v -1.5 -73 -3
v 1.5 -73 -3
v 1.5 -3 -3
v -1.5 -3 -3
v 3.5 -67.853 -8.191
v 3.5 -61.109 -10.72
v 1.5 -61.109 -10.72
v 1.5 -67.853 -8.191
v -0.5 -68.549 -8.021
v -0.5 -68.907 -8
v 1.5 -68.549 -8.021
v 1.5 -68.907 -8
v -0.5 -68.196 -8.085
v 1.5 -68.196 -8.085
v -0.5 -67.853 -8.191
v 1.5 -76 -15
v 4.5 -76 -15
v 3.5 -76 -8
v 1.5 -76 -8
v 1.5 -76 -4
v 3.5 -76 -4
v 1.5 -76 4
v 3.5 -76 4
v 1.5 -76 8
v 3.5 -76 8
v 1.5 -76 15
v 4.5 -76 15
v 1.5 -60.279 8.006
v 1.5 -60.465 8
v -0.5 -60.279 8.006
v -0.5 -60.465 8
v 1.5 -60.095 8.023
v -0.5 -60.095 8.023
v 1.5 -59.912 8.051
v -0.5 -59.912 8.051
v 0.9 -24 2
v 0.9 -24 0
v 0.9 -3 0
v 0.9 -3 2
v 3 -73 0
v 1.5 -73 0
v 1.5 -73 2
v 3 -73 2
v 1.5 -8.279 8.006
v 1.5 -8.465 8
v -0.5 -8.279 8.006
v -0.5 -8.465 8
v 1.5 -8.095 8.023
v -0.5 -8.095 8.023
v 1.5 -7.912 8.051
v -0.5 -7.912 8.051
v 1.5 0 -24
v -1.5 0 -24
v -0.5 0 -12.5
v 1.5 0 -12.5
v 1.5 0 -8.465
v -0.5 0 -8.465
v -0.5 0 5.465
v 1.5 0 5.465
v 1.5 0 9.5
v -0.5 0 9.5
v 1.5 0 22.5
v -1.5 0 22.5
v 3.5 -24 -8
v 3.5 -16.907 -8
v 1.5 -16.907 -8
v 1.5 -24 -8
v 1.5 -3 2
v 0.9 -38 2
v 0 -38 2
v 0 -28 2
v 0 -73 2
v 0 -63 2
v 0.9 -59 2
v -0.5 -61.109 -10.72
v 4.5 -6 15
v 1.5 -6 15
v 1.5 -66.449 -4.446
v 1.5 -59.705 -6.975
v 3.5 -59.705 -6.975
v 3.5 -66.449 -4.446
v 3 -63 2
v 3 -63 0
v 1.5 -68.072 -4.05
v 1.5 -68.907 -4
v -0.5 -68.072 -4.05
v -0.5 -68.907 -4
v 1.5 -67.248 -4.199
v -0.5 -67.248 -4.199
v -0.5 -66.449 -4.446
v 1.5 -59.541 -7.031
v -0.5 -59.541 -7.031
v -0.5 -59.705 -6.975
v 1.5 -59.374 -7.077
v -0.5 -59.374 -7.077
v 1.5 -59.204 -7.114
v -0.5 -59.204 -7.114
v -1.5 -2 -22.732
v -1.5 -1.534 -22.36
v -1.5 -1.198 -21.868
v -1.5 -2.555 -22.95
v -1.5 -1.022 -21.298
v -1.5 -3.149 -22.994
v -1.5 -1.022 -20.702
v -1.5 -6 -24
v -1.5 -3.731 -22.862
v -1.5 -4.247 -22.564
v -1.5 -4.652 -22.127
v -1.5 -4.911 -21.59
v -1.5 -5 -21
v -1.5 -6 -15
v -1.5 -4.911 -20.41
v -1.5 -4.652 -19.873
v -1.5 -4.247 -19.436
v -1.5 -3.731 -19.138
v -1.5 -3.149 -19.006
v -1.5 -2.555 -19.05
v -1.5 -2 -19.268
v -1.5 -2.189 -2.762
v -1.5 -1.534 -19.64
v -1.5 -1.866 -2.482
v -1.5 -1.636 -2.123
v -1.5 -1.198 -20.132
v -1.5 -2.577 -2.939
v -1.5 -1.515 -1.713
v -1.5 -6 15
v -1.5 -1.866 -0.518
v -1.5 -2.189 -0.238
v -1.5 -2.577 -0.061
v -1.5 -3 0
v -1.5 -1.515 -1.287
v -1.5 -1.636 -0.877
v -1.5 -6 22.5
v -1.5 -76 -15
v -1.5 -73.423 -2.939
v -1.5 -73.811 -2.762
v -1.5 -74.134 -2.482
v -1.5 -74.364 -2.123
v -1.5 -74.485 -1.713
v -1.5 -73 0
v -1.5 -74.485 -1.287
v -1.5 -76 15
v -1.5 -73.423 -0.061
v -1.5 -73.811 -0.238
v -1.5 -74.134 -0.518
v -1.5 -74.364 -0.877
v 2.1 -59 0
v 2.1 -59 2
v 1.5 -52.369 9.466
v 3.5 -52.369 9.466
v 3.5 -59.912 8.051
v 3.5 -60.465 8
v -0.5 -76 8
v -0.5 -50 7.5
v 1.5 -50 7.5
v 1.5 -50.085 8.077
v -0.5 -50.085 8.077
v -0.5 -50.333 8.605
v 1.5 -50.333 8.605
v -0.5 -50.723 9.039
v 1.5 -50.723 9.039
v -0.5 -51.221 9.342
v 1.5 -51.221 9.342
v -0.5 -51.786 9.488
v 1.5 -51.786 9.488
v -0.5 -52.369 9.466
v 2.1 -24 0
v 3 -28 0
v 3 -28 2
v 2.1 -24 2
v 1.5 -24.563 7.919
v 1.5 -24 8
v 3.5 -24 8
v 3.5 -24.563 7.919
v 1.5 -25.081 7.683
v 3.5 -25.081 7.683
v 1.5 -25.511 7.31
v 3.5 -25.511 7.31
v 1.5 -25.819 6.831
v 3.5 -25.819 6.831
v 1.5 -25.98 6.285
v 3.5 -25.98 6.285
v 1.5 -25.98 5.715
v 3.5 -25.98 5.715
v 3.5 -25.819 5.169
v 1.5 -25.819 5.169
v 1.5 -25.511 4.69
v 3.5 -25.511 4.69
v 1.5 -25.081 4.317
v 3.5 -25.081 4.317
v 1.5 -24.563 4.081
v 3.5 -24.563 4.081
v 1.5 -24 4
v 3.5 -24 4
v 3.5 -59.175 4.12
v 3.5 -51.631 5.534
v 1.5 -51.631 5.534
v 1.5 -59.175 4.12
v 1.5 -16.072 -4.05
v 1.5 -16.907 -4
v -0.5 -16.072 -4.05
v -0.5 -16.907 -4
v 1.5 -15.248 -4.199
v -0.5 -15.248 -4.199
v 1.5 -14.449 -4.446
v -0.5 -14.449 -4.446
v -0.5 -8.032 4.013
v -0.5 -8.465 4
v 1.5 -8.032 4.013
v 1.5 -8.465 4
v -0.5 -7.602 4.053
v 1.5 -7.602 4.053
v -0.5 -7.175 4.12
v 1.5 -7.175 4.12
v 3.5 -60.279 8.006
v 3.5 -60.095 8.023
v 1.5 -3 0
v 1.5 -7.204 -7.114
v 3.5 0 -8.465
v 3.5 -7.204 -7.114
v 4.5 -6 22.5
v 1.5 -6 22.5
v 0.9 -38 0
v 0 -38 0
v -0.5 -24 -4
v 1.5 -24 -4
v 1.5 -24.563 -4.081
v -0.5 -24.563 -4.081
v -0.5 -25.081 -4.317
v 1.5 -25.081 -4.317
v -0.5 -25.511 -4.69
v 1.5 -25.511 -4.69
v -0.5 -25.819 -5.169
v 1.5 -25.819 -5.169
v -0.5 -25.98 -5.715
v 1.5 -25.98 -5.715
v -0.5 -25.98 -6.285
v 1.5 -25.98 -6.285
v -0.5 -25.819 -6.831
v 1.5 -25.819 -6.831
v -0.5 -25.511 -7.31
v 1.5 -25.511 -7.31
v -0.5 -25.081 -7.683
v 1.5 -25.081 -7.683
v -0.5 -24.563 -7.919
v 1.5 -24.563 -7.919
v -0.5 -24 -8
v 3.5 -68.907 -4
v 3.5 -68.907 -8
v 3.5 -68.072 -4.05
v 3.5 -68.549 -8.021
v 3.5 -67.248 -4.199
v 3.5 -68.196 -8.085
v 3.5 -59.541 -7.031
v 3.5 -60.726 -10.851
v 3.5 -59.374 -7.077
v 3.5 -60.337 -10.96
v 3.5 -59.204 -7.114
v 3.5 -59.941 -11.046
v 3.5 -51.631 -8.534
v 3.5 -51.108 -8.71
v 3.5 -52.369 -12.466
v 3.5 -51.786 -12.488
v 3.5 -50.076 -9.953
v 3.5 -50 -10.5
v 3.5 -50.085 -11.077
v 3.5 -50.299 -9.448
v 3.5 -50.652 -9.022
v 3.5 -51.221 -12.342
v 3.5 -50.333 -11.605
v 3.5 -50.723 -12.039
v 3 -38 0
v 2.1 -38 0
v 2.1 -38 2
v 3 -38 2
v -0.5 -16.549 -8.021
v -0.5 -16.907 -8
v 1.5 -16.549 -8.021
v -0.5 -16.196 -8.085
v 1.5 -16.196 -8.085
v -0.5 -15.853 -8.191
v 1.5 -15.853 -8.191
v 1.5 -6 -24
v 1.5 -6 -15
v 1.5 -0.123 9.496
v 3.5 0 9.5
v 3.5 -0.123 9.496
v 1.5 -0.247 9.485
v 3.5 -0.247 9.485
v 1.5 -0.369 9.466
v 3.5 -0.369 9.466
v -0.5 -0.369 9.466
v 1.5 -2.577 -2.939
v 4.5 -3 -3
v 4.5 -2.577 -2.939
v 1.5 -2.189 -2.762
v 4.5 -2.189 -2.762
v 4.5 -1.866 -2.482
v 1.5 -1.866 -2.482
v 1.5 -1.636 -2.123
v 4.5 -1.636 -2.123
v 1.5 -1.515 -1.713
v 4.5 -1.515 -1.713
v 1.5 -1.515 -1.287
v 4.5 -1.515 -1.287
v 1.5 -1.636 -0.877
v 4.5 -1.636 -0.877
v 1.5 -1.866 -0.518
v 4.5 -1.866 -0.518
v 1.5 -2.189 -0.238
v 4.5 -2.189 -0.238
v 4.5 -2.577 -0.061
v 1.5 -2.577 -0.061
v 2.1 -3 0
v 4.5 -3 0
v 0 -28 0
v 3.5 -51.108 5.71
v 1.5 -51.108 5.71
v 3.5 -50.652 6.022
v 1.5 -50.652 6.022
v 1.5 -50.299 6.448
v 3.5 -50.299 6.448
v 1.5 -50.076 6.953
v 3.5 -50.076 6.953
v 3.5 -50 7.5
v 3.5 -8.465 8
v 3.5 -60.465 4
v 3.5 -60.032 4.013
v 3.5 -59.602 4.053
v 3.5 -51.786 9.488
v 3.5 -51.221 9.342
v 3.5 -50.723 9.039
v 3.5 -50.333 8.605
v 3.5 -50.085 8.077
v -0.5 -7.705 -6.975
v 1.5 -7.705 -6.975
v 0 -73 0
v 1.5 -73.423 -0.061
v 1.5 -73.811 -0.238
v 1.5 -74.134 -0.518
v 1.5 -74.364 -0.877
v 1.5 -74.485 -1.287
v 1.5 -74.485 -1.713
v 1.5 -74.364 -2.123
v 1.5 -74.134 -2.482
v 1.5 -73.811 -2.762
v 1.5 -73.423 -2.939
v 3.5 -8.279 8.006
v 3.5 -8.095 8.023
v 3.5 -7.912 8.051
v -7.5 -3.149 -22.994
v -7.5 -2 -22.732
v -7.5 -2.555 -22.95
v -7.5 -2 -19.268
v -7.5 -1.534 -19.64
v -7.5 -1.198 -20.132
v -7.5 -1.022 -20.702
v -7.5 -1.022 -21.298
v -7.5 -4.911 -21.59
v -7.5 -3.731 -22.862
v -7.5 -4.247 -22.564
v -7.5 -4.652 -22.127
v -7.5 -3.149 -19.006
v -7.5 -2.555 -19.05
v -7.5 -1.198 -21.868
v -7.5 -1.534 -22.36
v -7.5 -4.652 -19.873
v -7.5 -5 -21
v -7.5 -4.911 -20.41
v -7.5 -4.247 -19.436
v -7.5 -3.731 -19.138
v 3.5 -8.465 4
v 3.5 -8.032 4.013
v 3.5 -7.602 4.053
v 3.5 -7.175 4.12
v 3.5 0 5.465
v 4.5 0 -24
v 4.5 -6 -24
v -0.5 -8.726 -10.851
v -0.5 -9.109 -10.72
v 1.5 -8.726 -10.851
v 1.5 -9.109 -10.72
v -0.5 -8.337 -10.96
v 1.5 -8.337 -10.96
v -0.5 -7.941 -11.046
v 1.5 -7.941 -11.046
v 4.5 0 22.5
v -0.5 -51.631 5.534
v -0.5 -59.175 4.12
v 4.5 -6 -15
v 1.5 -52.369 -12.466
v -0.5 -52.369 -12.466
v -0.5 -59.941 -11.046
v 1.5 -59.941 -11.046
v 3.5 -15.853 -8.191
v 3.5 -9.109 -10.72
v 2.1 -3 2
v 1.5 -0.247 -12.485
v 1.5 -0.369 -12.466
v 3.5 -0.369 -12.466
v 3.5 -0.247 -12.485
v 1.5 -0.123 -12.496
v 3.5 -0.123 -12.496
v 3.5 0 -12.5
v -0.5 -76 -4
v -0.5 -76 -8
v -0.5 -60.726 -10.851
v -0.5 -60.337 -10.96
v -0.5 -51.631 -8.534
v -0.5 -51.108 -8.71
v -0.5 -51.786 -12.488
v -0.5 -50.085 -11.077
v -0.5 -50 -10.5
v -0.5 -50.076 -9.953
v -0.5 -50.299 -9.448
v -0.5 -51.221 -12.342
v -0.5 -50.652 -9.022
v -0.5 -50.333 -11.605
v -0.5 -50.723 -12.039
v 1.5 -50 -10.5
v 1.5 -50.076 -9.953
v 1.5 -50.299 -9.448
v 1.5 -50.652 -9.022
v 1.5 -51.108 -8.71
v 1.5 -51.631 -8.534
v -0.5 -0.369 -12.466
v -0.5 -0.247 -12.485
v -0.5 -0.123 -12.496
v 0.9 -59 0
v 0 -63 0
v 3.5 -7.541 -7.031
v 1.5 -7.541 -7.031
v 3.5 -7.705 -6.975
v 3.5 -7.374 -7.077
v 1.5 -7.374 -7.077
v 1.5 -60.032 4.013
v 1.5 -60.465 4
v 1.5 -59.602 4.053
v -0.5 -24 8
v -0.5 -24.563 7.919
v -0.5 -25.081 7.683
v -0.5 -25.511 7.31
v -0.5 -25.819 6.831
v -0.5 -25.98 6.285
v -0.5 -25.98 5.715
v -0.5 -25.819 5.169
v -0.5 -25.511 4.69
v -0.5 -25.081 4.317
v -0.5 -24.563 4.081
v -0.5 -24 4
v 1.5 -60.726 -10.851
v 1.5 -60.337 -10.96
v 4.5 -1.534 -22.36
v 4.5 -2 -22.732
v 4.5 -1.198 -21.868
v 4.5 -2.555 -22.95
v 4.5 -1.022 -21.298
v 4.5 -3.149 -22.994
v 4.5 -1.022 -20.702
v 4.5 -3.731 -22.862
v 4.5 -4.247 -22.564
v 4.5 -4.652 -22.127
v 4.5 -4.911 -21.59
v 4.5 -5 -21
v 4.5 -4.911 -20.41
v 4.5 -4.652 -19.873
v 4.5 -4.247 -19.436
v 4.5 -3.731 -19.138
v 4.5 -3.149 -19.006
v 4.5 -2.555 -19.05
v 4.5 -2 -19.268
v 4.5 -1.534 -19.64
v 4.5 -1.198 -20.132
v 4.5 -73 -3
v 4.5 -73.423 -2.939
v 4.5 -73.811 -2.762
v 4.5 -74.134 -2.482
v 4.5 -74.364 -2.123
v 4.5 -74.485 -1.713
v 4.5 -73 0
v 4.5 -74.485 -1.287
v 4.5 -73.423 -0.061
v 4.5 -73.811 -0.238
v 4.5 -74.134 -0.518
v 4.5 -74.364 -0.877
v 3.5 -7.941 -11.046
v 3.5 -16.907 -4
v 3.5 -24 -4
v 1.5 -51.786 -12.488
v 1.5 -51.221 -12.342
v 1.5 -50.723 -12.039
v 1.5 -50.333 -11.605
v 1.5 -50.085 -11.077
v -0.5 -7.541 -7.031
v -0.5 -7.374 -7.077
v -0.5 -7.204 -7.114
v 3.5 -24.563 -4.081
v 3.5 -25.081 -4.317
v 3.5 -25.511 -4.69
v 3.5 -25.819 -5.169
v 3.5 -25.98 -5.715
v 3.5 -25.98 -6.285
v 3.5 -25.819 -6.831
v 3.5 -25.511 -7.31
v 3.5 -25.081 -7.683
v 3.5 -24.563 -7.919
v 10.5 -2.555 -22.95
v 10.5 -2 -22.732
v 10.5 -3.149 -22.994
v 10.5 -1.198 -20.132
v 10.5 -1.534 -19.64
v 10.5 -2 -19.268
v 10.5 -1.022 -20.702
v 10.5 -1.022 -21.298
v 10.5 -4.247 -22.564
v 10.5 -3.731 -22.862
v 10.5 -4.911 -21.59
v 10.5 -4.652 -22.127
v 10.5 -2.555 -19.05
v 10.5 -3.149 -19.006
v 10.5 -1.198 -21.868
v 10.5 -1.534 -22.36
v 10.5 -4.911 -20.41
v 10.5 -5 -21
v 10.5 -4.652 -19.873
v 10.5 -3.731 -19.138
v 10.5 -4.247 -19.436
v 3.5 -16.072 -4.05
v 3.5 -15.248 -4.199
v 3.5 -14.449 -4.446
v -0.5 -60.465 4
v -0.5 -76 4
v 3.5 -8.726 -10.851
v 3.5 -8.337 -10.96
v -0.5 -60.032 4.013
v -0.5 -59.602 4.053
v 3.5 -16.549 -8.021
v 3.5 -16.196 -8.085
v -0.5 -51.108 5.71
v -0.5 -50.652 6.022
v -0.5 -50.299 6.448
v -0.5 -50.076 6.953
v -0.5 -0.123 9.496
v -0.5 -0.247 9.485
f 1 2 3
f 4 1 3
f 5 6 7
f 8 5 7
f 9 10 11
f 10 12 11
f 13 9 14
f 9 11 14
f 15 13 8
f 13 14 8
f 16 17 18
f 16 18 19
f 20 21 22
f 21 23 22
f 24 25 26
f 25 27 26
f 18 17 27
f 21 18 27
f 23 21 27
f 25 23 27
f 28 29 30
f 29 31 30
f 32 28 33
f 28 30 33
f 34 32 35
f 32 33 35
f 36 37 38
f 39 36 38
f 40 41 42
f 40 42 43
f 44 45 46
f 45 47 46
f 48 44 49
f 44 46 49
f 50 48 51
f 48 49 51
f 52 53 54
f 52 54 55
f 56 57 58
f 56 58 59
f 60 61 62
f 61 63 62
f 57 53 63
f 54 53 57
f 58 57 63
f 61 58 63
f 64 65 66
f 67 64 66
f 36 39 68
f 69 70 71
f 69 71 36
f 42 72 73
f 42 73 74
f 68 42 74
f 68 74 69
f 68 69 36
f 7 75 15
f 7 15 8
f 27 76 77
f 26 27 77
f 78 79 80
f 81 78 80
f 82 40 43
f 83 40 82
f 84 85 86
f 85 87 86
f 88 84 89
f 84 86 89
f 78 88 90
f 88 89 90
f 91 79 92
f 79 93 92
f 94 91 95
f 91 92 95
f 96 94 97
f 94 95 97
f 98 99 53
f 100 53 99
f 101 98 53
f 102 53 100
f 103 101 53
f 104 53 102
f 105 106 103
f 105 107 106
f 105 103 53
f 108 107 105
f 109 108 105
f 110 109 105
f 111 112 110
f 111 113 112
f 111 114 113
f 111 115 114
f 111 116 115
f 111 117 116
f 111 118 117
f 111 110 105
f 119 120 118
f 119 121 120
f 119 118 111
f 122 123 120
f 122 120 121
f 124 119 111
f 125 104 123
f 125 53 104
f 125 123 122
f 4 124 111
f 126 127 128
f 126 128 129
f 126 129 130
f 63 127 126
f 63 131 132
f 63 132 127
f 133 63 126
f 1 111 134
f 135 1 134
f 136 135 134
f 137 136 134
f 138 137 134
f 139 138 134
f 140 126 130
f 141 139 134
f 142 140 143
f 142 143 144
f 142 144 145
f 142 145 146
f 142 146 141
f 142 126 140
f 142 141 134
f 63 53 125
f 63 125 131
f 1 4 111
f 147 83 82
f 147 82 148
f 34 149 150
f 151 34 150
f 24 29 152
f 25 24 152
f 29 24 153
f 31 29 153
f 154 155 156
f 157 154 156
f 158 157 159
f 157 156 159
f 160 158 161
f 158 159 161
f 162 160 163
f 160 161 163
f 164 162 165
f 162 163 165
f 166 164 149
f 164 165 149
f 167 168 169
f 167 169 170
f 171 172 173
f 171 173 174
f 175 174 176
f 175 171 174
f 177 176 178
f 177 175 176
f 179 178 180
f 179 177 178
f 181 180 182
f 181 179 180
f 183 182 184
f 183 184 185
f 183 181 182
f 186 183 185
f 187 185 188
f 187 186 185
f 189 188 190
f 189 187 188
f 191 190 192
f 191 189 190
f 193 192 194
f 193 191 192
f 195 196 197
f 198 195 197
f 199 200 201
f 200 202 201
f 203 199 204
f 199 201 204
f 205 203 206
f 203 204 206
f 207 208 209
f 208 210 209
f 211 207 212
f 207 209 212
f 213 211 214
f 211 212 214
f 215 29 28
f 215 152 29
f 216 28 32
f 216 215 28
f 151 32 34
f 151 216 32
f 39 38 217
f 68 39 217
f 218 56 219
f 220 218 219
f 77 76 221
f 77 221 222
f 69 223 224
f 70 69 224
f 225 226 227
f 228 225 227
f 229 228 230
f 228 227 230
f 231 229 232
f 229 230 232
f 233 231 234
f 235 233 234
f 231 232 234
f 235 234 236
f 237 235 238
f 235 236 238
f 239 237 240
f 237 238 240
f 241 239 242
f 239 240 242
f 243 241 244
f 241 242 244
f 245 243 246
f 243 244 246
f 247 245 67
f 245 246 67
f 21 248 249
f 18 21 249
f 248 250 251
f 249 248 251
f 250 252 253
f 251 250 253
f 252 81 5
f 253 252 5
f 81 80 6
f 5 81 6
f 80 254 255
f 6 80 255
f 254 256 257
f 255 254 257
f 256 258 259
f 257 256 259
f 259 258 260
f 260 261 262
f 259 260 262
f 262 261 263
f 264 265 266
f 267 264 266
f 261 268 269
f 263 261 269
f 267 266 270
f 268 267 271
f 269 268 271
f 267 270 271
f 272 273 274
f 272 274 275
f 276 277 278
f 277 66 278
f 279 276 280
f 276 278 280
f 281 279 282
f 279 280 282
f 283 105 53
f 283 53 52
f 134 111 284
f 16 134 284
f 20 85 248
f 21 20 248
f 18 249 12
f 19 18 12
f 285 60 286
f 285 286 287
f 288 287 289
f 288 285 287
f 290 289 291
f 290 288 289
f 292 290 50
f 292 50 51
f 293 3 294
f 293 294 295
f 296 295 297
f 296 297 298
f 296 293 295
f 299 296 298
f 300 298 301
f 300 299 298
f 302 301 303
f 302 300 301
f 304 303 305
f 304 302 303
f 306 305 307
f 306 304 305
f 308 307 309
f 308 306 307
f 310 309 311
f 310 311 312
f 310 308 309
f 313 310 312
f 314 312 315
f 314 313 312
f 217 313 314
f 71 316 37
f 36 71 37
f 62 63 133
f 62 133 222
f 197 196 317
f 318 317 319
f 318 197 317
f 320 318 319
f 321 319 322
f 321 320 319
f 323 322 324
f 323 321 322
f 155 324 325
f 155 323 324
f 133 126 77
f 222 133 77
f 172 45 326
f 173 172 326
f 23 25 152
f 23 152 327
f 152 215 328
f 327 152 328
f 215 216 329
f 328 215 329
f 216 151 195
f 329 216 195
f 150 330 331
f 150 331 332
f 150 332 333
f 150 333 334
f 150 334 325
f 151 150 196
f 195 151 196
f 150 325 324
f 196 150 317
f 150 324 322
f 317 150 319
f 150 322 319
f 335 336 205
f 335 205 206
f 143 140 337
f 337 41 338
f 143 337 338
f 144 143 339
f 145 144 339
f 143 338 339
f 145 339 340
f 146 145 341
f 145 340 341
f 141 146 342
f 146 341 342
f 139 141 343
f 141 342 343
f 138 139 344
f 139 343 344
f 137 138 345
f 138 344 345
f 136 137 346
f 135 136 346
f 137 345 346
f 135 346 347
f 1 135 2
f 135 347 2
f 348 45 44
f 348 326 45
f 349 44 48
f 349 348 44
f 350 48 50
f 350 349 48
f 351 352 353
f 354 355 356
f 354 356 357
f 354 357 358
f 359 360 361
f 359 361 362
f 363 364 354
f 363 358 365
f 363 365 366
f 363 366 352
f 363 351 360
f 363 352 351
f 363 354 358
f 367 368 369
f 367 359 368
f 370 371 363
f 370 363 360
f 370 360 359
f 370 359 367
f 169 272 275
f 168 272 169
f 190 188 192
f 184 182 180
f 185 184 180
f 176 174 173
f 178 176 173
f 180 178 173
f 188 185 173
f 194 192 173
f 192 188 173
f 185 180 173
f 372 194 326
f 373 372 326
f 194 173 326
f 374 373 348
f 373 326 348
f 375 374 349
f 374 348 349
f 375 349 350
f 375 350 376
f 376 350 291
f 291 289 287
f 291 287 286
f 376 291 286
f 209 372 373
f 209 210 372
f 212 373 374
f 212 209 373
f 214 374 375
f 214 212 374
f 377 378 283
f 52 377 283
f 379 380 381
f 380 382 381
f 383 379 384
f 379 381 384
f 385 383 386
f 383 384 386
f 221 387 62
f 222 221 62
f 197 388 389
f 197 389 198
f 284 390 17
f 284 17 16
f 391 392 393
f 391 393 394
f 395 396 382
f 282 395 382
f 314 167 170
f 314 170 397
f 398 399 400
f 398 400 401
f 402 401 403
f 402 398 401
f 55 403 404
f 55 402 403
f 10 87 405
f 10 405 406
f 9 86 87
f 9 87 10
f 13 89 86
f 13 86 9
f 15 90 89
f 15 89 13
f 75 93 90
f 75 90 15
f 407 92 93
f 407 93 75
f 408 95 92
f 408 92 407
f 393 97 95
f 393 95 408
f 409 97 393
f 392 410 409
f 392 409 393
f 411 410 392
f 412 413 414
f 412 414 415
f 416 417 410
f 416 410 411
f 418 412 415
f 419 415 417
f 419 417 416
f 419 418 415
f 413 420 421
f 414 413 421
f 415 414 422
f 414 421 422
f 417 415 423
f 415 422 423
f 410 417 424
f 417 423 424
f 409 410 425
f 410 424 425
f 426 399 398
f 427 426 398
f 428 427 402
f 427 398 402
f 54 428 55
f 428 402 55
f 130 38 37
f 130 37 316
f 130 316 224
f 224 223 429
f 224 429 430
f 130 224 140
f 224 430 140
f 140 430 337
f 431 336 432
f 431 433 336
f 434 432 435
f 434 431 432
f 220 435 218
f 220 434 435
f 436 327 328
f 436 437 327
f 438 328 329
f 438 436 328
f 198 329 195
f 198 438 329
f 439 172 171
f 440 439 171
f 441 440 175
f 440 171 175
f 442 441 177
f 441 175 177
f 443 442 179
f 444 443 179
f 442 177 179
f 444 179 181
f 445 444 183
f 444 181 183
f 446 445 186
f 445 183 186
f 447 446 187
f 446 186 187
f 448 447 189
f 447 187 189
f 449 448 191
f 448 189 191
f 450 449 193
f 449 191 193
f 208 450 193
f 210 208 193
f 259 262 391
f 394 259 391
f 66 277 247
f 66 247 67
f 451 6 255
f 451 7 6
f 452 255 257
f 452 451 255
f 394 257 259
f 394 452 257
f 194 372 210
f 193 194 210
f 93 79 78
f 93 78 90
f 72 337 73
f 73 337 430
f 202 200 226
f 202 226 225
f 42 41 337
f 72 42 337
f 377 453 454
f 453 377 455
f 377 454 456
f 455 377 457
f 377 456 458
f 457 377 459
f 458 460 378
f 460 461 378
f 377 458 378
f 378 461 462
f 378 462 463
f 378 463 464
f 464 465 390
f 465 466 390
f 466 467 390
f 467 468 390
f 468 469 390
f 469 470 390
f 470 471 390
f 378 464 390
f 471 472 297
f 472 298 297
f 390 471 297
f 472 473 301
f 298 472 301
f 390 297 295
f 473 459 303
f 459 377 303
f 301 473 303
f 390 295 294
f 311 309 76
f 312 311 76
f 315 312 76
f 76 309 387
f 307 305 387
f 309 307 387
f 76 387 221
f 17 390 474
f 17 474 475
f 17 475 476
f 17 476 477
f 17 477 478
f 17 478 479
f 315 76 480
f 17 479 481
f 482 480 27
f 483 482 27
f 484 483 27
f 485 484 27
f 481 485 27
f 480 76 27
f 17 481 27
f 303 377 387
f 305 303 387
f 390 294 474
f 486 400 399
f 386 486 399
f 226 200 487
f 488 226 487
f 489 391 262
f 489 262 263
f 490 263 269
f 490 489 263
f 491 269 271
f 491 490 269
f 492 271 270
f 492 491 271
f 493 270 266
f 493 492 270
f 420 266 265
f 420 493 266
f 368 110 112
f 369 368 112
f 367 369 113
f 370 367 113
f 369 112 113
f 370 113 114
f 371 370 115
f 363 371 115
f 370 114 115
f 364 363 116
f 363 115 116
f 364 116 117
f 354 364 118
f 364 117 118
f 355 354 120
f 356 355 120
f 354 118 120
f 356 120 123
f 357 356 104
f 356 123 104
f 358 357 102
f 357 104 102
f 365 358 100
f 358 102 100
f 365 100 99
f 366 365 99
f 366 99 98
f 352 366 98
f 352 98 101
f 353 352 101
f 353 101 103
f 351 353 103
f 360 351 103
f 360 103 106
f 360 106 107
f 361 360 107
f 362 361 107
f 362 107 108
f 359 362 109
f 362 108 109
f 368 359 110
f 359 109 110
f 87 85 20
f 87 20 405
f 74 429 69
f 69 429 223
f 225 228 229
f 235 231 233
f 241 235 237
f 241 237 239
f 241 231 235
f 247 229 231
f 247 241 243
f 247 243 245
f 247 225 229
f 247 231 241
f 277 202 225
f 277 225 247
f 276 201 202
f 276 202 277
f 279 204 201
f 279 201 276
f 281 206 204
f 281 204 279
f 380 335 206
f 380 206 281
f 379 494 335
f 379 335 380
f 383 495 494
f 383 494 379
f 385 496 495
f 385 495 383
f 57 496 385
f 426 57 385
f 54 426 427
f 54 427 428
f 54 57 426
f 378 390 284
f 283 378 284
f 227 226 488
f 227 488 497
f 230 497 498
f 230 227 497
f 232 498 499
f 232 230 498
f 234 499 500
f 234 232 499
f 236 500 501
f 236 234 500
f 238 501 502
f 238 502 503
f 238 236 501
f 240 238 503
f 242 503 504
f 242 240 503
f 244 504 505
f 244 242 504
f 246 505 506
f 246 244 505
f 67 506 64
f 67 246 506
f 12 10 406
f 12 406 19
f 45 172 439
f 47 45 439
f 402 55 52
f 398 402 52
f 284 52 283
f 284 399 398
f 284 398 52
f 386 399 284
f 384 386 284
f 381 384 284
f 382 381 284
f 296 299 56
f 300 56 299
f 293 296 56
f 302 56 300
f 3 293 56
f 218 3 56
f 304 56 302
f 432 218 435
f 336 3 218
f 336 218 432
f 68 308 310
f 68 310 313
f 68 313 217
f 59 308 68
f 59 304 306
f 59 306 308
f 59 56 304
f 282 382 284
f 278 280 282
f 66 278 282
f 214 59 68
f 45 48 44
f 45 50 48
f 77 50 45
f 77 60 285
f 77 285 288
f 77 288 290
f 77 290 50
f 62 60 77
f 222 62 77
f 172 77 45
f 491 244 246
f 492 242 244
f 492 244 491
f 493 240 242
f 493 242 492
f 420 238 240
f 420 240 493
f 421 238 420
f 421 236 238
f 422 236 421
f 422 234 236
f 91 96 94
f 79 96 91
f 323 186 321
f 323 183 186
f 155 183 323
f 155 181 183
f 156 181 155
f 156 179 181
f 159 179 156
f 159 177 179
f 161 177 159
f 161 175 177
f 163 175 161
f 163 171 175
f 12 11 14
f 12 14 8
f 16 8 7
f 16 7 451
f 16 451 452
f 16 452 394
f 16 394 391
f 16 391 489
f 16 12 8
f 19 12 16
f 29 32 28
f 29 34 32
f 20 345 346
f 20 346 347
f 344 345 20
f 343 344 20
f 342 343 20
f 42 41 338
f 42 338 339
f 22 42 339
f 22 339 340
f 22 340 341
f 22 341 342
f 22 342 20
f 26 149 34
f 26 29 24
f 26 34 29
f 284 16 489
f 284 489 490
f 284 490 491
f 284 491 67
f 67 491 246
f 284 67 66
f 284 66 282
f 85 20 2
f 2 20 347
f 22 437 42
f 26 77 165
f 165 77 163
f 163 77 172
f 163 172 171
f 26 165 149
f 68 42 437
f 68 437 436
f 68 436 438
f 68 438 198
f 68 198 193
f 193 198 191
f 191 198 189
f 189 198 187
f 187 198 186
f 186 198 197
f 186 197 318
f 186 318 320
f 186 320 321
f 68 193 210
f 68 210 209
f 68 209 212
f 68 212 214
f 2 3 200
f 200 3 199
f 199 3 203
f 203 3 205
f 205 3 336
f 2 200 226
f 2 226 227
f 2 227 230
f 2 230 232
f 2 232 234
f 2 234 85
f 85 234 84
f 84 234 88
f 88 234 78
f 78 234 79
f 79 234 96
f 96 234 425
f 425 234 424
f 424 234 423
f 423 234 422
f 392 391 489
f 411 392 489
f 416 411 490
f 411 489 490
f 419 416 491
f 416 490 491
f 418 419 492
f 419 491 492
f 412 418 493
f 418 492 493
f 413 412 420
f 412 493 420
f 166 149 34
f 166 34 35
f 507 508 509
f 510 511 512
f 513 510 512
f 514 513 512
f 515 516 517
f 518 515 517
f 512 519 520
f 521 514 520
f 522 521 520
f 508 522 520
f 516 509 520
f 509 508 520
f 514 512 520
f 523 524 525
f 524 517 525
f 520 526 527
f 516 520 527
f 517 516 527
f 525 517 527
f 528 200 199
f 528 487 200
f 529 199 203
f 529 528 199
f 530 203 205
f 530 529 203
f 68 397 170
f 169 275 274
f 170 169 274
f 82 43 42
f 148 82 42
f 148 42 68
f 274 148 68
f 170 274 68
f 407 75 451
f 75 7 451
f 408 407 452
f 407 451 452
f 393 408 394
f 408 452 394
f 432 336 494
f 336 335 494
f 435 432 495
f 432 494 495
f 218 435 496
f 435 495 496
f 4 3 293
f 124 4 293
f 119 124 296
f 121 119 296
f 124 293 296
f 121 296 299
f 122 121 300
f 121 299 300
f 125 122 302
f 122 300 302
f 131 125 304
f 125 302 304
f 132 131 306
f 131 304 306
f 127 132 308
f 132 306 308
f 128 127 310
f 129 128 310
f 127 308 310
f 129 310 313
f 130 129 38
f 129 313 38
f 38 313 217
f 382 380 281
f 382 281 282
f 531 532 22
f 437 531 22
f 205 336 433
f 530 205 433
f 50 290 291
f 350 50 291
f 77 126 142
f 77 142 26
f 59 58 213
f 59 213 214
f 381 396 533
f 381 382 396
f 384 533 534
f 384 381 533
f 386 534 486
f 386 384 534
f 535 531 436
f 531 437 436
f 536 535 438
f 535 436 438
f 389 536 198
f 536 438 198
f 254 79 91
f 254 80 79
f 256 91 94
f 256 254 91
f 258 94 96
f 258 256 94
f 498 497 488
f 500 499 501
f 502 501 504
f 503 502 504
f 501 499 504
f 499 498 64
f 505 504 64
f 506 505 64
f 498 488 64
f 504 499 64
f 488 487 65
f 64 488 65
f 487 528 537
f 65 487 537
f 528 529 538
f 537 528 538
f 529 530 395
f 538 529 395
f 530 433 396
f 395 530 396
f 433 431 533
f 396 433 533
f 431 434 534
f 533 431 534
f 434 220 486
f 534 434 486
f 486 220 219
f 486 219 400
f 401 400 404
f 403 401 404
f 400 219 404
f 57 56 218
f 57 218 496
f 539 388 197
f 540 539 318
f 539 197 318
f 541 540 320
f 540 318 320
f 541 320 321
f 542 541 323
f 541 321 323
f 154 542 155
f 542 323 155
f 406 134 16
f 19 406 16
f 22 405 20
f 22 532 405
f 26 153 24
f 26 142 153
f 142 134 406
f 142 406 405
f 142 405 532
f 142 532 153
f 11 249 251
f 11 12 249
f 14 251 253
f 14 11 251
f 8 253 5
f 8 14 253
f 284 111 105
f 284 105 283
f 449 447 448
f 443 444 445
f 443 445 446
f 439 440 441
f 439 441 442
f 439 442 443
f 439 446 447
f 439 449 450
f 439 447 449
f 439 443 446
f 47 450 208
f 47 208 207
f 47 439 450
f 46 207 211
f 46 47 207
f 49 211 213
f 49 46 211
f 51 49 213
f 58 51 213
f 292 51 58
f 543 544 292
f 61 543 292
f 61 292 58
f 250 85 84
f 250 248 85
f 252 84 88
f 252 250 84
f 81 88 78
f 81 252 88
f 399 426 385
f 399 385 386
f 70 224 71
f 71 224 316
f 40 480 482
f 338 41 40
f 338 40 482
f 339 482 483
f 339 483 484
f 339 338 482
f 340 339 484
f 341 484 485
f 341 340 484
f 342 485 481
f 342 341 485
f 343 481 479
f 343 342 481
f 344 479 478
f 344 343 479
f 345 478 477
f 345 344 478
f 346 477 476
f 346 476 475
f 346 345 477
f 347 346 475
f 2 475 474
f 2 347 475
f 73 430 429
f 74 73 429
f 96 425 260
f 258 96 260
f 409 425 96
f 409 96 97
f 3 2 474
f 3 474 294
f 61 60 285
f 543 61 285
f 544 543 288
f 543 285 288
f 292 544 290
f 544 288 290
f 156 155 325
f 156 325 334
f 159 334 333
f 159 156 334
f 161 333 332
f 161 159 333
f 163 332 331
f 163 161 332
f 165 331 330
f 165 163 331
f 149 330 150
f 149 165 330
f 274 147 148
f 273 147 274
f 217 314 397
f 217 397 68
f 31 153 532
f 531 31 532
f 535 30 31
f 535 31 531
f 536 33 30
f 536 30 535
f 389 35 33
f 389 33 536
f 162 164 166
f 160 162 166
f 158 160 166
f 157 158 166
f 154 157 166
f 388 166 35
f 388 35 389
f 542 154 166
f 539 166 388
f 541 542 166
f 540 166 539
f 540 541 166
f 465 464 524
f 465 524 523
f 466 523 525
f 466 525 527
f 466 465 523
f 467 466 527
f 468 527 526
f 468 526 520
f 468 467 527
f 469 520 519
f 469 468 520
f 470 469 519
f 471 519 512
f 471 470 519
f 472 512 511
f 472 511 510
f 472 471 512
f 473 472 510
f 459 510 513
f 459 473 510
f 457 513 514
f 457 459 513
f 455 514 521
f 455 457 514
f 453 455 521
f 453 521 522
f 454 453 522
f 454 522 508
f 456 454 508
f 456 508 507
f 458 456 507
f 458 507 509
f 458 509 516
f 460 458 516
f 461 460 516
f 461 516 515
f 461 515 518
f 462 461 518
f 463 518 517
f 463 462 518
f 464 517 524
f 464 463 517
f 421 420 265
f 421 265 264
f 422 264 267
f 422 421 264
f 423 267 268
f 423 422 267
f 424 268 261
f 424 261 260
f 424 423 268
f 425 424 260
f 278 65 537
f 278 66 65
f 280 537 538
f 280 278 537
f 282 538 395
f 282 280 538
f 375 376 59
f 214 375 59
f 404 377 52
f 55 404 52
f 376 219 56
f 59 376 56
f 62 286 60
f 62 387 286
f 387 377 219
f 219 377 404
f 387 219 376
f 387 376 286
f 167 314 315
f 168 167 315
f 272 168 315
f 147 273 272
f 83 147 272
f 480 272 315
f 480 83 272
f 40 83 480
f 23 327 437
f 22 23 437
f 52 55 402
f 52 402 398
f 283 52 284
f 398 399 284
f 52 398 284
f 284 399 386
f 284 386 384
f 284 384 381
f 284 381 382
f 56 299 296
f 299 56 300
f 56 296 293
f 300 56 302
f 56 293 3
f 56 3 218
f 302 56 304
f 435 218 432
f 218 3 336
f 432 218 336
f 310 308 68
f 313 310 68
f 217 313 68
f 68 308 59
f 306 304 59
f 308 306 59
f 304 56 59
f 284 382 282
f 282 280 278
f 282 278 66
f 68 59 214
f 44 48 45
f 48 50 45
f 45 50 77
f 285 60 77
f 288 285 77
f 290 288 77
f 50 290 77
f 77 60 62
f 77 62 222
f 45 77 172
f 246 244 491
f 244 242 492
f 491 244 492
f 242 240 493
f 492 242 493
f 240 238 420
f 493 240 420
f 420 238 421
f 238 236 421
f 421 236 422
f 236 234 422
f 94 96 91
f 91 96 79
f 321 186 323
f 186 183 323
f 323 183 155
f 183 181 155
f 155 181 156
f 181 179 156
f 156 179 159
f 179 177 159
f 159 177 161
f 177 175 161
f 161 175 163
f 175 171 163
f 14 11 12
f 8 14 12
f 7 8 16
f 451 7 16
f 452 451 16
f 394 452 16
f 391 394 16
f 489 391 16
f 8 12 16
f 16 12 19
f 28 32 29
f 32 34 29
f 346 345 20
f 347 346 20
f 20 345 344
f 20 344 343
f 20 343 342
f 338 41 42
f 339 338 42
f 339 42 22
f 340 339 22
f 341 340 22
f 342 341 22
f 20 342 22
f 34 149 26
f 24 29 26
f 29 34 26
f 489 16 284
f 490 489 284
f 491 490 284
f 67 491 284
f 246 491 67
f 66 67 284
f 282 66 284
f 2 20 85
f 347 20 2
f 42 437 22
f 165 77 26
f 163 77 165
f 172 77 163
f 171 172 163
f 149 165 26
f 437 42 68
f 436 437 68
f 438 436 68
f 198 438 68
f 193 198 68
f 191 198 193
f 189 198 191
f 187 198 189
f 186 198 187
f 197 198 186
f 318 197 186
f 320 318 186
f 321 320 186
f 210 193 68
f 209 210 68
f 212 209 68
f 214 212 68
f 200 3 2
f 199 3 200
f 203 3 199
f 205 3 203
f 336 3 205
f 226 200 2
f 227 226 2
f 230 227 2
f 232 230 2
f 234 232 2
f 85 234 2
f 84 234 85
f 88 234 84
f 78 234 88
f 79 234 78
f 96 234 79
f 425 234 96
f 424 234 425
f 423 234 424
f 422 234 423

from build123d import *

# Parameters (mm, degrees)
F0_W      = 3
F0_H      = 30
F1_DEPTH  = 76
F3_W      = 2
F3_H      = 4
F7_W      = 2
F7_H      = 4
F2_R      = 2
F10_DEPTH = 2
F11_DEPTH = 3.001
F13_DEPTH = 2
F14_W     = 3
F14_H     = 6
F15_DEPTH = 7.5
F16_W     = 3
F16_H     = 6
F17_DEPTH = 9
F18_R     = 2
F19_DEPTH = 6


# Not quite as in the source:
# - a feature names something its author has since deleted; it is built from what else it names


with BuildPart() as f1:
    # F0 (on Front) → F1 (new body)
    with BuildSketch(Plane.XZ):
        Rectangle(F0_W, F0_H)
    extrude(amount=F1_DEPTH)

    # F4: sweep along a path in F2
    with BuildLine(Plane.YZ.offset(1.5)) as f4_path:
        Line((-76, -6), (-68.9066729089, -6))
        ThreePointArc((-68.9066729089, -6), (-68.0145488814, -6.0802322494), (-67.1510557009, -6.3183541122))
        Line((-67.1510557009, -6.3183541122), (-60.4069723837, -8.8473853561))
        ThreePointArc((-60.4069723837, -8.8473853561), (-59.9949330402, -8.9818373205), (-59.572797851, -9.0801004029))
        Line((-59.572797851, -9.0801004029), (-52, -10.5))
    # F3 (on face) → F4 (sweep, cut)
    with BuildSketch(Plane.XZ.offset(76)):
        with Locations((0.5, -6)):
            Rectangle(F3_W, F3_H)
    sweep(path=f4_path.line, mode=Mode.SUBTRACT)

    # F5: sweep along a path in F2
    with BuildLine(Plane.YZ.offset(1.5)) as f5_path:
        Line((-76, 6), (-68, 6))
        Line((-68, 6), (-60.4647009935, 6))
        ThreePointArc((-60.4647009935, 6), (-60.0019941065, 6.0214558015), (-59.5432583182, 6.0856390653))
        Line((-59.5432583182, 6.0856390653), (-52, 7.5))
    # F3 (on face) → F5 (sweep, cut)
    with BuildSketch(Plane.XZ.offset(76)):
        with Locations((0.5, 6)):
            Rectangle(F3_W, F3_H)
    sweep(path=f5_path.line, mode=Mode.SUBTRACT)

    # F8: sweep along a path in F2
    with BuildLine(Plane.YZ.offset(1.5)) as f8_path:
        Line((-24, -6), (-16.9066729089, -6))
        ThreePointArc((-16.9066729089, -6), (-16.0145488814, -6.0802322494), (-15.1510557009, -6.3183541122))
        Line((-15.1510557009, -6.3183541122), (-8.4069723837, -8.8473853561))
        ThreePointArc((-8.4069723837, -8.8473853561), (-7.9949330402, -8.9818373205), (-7.572797851, -9.0801004029))
        Line((-7.572797851, -9.0801004029), (0, -10.5))
    # F7 (on offset) → F8 (sweep, cut)
    with BuildSketch(Plane.XZ.offset(24)):
        with Locations((0.5, -6)):
            Rectangle(F7_W, F7_H)
    sweep(path=f8_path.line, mode=Mode.SUBTRACT)

    # F9: sweep along a path in F2
    with BuildLine(Plane.YZ.offset(1.5)) as f9_path:
        Line((-24, 6), (-16, 6))
        Line((-16, 6), (-8.4647009935, 6))
        ThreePointArc((-8.4647009935, 6), (-8.0019941065, 6.0214558015), (-7.5432583182, 6.0856390653))
        Line((-7.5432583182, 6.0856390653), (0, 7.5))
    # F7 (on offset) → F9 (sweep, cut)
    with BuildSketch(Plane.XZ.offset(24)):
        with Locations((0.5, 6)):
            Rectangle(F7_W, F7_H)
    sweep(path=f9_path.line, mode=Mode.SUBTRACT)

    # F2 (on face) → F10 (cut)
    with BuildSketch(Plane.YZ.offset(1.5)):
        with BuildLine():
            ThreePointArc((-50, 7.5), (-52.1850827548, 9.4914176794), (-53.9657443739, 7.1314229299))
            ThreePointArc((-53.9657443739, 7.1314229299), (-51.8149172452, 5.5085823206), (-50, 7.5))
        make_face()
        with BuildLine():
            ThreePointArc((-50, -10.5), (-51.8149172452, -8.5085823206), (-53.9657443739, -10.1314229299))
            ThreePointArc((-53.9657443739, -10.1314229299), (-52.1850827548, -12.4914176794), (-50, -10.5))
        make_face()
        with BuildLine():
            Line((0, 7.5), (0, 9.5))
            ThreePointArc((0, 9.5), (-1.5390182163, 8.7772716743), (-1.9657443739, 7.1314229299))
            Line((-1.9657443739, 7.1314229299), (0, 7.5))
        make_face()
        with BuildLine():
            ThreePointArc((-1.9657443739, -10.1314229299), (-1.5390182163, -11.7772716743), (0, -12.5))
            Line((0, -12.5), (0, -10.5))
            Line((0, -10.5), (-1.9657443739, -10.1314229299))
        make_face()
        with Locations((-24, 6)):
            Circle(F2_R)
        with Locations((-24, -6)):
            Circle(F2_R)
    extrude(amount=-F10_DEPTH, mode=Mode.SUBTRACT)

    # F2 (on face) → F11 (cut, through all)
    with BuildSketch(Plane.YZ.offset(1.5)):
        with BuildLine():
            Line((-38, 0), (-73, 0))
            ThreePointArc((-73, 0), (-74.5, -1.5), (-73, -3))
            Line((-73, -3), (-38, -3))
            Line((-38, -3), (-38, 0))
        make_face()
        with BuildLine():
            Line((-3, 0), (-38, 0))
            Line((-38, 0), (-38, -3))
            Line((-38, -3), (-3, -3))
            ThreePointArc((-3, -3), (-1.5, -1.5), (-3, 0))
        make_face()
    extrude(amount=-F11_DEPTH, mode=Mode.SUBTRACT)

    # F12 (on face) → F13 (cut)
    with BuildSketch(Plane(origin=(0, 0, 0), x_dir=(1, 0, 0), z_dir=(0, 0, -1))):
        Polygon((1.5, 38), (1.5, 73), (0, 73), (0, 63), (0.9, 59), (0.9, 38), align=None)
        Polygon((1.5, 3), (1.5, 38), (0.9, 38), (0, 38), (0, 28), (0.9, 24), (0.9, 3), align=None)
    extrude(amount=-F13_DEPTH, mode=Mode.SUBTRACT)

    # F14 (on face) → F15 (join)
    with BuildSketch(Plane.XY.offset(15)):
        with Locations((0, -3)):
            Rectangle(F14_W, F14_H)
    extrude(amount=F15_DEPTH)

    # F16 (on face) → F17 (join)
    with BuildSketch(Plane(origin=(0, 0, -15), x_dir=(1, 0, 0), z_dir=(0, 0, -1))):
        with Locations((0, 3)):
            Rectangle(F16_W, F16_H)
    extrude(amount=F17_DEPTH)

    # F18 (on face) → F19 (join)
    with BuildSketch(Plane(origin=(-1.5, 0, 0), x_dir=(0, -1, 0), z_dir=(-1, 0, 0))):
        with Locations((3, -21)):
            Circle(F18_R)
    extrude(amount=F19_DEPTH)


with BuildPart() as f20_1:
    # F20: instance of F1
    add(f1.part.mirror(Plane(origin=(1.5, -35.8541868499, 0.1982615546), x_dir=(0, 1, 0), z_dir=(1, 0, 0))))


solid = Compound([f1.part, f20_1.part])
